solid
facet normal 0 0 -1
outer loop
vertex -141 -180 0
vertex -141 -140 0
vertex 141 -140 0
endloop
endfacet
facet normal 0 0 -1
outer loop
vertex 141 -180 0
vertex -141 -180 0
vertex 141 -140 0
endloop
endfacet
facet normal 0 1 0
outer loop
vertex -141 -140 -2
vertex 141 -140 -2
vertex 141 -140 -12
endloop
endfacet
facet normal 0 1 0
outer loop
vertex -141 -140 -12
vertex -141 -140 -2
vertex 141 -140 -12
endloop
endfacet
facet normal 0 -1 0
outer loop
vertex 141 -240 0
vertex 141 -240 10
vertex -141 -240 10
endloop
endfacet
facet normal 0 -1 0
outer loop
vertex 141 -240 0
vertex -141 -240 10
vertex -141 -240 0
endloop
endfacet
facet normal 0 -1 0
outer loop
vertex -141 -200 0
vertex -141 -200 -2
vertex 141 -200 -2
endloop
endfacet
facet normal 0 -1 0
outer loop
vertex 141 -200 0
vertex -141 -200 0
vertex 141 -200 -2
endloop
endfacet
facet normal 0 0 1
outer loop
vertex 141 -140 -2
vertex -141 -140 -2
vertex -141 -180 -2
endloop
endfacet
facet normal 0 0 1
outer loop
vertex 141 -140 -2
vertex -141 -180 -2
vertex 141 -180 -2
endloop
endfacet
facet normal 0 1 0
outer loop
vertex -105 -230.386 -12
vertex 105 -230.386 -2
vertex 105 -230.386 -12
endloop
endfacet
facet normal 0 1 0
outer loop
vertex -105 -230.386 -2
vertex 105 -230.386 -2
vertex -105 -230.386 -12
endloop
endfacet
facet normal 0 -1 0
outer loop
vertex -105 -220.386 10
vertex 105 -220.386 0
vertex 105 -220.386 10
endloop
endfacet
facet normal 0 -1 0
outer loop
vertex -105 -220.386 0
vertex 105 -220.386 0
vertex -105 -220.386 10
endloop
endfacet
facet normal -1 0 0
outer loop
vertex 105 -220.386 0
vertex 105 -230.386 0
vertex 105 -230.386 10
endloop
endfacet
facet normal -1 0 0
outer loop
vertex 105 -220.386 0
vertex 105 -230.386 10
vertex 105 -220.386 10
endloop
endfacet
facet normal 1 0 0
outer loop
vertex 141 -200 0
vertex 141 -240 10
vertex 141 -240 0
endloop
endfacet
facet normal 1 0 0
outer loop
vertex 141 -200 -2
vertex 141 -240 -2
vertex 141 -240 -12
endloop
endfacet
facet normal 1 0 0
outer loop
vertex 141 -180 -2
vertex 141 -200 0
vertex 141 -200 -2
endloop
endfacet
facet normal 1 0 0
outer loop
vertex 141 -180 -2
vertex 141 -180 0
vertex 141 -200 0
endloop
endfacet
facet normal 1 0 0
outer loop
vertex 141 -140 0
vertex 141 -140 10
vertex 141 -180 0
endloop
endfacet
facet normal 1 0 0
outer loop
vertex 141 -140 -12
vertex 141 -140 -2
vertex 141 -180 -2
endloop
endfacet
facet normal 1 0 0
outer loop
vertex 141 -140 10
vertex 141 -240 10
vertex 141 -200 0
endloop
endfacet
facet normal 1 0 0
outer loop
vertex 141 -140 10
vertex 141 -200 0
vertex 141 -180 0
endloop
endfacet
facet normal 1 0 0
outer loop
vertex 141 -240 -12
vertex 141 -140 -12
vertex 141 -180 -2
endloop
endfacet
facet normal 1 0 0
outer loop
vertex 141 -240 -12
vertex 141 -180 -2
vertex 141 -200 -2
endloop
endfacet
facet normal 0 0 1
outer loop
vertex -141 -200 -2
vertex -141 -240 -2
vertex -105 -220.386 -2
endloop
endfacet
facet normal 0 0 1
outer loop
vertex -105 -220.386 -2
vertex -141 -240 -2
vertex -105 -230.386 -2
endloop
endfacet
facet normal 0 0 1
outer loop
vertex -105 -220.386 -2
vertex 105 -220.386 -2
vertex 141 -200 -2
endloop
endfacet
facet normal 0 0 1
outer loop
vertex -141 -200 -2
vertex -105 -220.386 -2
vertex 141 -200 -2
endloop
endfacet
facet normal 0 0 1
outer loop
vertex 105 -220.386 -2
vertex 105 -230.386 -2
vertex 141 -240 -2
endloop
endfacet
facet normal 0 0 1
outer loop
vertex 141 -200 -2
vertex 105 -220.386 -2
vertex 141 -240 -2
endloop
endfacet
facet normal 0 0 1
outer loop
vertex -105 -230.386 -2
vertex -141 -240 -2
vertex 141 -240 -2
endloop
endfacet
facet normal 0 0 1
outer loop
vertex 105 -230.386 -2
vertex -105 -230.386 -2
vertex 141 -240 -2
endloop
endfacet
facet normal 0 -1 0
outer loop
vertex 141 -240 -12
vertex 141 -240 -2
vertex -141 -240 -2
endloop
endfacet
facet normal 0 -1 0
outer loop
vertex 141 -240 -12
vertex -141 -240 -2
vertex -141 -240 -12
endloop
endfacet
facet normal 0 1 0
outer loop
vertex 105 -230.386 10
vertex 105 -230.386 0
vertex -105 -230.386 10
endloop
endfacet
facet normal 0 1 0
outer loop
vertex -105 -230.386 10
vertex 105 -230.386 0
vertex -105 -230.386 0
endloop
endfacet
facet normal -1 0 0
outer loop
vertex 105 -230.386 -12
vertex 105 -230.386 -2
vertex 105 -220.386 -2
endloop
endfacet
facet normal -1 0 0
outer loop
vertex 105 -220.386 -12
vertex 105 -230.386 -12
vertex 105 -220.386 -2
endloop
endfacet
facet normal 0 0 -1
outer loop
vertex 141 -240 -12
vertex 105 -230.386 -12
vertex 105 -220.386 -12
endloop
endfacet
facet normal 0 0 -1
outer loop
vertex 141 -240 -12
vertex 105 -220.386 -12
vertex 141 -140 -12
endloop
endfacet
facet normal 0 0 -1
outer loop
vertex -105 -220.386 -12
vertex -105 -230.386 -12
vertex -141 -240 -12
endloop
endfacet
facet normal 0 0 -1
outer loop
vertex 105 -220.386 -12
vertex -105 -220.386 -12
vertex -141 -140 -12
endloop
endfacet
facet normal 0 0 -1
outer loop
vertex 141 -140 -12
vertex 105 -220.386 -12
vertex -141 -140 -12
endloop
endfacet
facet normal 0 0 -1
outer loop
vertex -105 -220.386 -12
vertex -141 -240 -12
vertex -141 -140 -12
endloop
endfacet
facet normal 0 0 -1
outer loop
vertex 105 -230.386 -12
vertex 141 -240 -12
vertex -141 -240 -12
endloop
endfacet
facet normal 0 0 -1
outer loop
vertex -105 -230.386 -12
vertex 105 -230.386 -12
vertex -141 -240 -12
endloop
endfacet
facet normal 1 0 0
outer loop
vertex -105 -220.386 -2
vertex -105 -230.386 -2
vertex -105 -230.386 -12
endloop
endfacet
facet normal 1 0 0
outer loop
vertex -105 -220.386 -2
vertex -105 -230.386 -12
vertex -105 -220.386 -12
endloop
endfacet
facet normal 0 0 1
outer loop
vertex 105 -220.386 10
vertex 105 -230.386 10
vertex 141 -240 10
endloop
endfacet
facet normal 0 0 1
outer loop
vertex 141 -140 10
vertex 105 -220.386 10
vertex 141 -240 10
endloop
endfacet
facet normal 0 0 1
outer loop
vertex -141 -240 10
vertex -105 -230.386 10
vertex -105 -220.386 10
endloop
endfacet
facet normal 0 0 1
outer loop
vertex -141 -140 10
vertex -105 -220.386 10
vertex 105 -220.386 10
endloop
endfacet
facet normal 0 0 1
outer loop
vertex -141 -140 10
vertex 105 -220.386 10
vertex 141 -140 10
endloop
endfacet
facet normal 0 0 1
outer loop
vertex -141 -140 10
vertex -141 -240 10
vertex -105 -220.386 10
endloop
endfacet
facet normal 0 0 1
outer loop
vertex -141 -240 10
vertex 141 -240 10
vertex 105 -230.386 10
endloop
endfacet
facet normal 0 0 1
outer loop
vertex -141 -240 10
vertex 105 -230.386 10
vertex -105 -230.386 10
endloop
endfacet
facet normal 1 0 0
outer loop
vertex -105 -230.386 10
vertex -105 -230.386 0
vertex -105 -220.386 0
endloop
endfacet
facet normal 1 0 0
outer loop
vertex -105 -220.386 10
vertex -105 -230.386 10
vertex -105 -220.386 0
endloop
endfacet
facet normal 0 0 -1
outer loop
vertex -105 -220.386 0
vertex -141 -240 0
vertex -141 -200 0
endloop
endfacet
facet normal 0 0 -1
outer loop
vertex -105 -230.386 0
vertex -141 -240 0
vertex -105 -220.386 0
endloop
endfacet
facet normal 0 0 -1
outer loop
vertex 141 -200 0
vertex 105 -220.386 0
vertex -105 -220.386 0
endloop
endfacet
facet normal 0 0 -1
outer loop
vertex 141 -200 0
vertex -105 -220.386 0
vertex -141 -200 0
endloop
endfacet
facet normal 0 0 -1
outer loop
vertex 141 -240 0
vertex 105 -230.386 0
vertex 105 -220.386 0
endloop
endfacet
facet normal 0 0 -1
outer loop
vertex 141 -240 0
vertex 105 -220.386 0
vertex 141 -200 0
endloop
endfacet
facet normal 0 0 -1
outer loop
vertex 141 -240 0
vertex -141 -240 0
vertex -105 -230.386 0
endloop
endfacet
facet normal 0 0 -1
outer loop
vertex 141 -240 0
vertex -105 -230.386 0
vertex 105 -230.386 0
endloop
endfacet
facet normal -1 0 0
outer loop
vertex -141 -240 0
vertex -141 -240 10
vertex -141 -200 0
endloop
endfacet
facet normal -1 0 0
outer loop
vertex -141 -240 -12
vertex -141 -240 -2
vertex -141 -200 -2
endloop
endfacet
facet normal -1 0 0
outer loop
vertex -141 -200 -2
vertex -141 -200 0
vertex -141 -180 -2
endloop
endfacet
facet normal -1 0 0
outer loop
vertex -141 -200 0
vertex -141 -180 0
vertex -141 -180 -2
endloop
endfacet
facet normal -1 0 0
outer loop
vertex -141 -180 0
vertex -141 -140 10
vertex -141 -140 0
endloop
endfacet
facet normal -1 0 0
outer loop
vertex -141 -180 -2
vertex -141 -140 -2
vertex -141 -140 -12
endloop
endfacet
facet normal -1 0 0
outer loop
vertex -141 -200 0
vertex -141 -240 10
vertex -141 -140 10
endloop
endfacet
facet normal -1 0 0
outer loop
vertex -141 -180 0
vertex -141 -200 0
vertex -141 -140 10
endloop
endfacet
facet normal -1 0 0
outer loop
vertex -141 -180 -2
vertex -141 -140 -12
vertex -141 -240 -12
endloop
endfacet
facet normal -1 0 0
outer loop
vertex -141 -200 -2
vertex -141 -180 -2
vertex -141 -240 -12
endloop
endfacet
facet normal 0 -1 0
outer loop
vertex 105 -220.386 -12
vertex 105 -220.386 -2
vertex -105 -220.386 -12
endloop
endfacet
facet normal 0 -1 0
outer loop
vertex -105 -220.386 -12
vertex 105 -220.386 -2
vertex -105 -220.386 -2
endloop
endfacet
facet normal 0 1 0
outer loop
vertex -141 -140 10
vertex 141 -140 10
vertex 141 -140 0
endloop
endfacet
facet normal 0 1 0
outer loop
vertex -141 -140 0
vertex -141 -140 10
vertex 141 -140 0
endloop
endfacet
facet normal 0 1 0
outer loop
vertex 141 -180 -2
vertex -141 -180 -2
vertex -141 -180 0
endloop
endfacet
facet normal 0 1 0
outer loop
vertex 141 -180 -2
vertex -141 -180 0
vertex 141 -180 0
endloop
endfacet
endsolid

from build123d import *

# Parameters (mm, degrees)
BOSS_EXTRUDE1_DEPTH            = 141
BOSS_EXTRUDE1_DEPTH_BACK       = 141
SKETCH1_W                      = 22
SKETCH1_H                      = 100
CAVITY1_START                  = -2
CAVITY1_OUTLINE_W              = 282
CAVITY1_OUTLINE_H              = 40
CAVITY1_DEPTH                  = 2
CUT_EXTRUDE1_REACH             = 280.613
SKETCH2_W                      = 210
SKETCH2_H                      = 10
CUT_EXTRUDE1_DIRECTION_2_REACH = 280.613


# Read off the part's stored shape, not the designer's step: Cavity1
with BuildPart() as part:
    # Sketch1 → Boss-Extrude1 (new, two sides: drawn at the far end of the back side and taken through both)
    with BuildSketch(Plane(origin=(0, 0, 0), x_dir=(0, 0, -1), z_dir=(1, 0, 0)).offset(-BOSS_EXTRUDE1_DEPTH_BACK)):
        with Locations((1, -190)):
            Rectangle(SKETCH1_W, SKETCH1_H)
    extrude(amount=BOSS_EXTRUDE1_DEPTH + BOSS_EXTRUDE1_DEPTH_BACK)

    # Cavity1 outline → Cavity1 (cut)
    with BuildSketch(Plane.XY.offset(CAVITY1_START)):
        with Locations((0, -160)):
            Rectangle(CAVITY1_OUTLINE_W, CAVITY1_OUTLINE_H)
    cavity1 = extrude(amount=CAVITY1_DEPTH, mode=Mode.SUBTRACT)

    # Mirror1: Cavity1 across plane
    add(cavity1.mirror(Plane.ZX.offset(-190)), mode=Mode.SUBTRACT)

    # Cut-Extrude1: up to this face of the body (flat: up to its plane)
    cut_extrude1_end = Plane(part.part.faces().sort_by_distance((0, -190, 10))[0])
    # Sketch2 → Cut-Extrude1 (cut, up to the picked face)
    with BuildSketch(Plane(origin=(0, 0, 0), x_dir=(-1, 0, 0), z_dir=(0, 0, -1)), mode=Mode.PRIVATE) as cut_extrude1_sk1:
        with Locations((0, -225.386342941)):
            Rectangle(SKETCH2_W, SKETCH2_H)
    cut_extrude1_tool1 = split(extrude(cut_extrude1_sk1.sketch, amount=-CUT_EXTRUDE1_REACH, mode=Mode.PRIVATE), bisect_by=cut_extrude1_end, keep=Keep.BOTH, mode=Mode.PRIVATE)
    add(cut_extrude1_tool1.solids().sort_by(Axis((0, -225.386343, 0), (0, 0, 1)))[0], mode=Mode.SUBTRACT)

    # Cut-Extrude1 direction 2: up to this face of the body (flat: up to its plane)
    cut_extrude1_direction_2_end = Plane(part.part.faces().sort_by_distance((0, -190, -12))[0])
    # Sketch2 → Cut-Extrude1 direction 2 (cut, up to the picked face)
    with BuildSketch(Plane(origin=(0, 0, 0), x_dir=(-1, 0, 0), z_dir=(0, 0, -1)), mode=Mode.PRIVATE) as cut_extrude1_direction_2_sk1:
        with Locations((0, -225.386342941)):
            Rectangle(SKETCH2_W, SKETCH2_H)
    cut_extrude1_direction_2_tool1 = split(extrude(cut_extrude1_direction_2_sk1.sketch, amount=CUT_EXTRUDE1_DIRECTION_2_REACH, mode=Mode.PRIVATE), bisect_by=cut_extrude1_direction_2_end, keep=Keep.BOTH, mode=Mode.PRIVATE)
    add(cut_extrude1_direction_2_tool1.solids().sort_by(Axis((0, -225.386343, 0), (0, 0, -1)))[0], mode=Mode.SUBTRACT)


solid = part.part
